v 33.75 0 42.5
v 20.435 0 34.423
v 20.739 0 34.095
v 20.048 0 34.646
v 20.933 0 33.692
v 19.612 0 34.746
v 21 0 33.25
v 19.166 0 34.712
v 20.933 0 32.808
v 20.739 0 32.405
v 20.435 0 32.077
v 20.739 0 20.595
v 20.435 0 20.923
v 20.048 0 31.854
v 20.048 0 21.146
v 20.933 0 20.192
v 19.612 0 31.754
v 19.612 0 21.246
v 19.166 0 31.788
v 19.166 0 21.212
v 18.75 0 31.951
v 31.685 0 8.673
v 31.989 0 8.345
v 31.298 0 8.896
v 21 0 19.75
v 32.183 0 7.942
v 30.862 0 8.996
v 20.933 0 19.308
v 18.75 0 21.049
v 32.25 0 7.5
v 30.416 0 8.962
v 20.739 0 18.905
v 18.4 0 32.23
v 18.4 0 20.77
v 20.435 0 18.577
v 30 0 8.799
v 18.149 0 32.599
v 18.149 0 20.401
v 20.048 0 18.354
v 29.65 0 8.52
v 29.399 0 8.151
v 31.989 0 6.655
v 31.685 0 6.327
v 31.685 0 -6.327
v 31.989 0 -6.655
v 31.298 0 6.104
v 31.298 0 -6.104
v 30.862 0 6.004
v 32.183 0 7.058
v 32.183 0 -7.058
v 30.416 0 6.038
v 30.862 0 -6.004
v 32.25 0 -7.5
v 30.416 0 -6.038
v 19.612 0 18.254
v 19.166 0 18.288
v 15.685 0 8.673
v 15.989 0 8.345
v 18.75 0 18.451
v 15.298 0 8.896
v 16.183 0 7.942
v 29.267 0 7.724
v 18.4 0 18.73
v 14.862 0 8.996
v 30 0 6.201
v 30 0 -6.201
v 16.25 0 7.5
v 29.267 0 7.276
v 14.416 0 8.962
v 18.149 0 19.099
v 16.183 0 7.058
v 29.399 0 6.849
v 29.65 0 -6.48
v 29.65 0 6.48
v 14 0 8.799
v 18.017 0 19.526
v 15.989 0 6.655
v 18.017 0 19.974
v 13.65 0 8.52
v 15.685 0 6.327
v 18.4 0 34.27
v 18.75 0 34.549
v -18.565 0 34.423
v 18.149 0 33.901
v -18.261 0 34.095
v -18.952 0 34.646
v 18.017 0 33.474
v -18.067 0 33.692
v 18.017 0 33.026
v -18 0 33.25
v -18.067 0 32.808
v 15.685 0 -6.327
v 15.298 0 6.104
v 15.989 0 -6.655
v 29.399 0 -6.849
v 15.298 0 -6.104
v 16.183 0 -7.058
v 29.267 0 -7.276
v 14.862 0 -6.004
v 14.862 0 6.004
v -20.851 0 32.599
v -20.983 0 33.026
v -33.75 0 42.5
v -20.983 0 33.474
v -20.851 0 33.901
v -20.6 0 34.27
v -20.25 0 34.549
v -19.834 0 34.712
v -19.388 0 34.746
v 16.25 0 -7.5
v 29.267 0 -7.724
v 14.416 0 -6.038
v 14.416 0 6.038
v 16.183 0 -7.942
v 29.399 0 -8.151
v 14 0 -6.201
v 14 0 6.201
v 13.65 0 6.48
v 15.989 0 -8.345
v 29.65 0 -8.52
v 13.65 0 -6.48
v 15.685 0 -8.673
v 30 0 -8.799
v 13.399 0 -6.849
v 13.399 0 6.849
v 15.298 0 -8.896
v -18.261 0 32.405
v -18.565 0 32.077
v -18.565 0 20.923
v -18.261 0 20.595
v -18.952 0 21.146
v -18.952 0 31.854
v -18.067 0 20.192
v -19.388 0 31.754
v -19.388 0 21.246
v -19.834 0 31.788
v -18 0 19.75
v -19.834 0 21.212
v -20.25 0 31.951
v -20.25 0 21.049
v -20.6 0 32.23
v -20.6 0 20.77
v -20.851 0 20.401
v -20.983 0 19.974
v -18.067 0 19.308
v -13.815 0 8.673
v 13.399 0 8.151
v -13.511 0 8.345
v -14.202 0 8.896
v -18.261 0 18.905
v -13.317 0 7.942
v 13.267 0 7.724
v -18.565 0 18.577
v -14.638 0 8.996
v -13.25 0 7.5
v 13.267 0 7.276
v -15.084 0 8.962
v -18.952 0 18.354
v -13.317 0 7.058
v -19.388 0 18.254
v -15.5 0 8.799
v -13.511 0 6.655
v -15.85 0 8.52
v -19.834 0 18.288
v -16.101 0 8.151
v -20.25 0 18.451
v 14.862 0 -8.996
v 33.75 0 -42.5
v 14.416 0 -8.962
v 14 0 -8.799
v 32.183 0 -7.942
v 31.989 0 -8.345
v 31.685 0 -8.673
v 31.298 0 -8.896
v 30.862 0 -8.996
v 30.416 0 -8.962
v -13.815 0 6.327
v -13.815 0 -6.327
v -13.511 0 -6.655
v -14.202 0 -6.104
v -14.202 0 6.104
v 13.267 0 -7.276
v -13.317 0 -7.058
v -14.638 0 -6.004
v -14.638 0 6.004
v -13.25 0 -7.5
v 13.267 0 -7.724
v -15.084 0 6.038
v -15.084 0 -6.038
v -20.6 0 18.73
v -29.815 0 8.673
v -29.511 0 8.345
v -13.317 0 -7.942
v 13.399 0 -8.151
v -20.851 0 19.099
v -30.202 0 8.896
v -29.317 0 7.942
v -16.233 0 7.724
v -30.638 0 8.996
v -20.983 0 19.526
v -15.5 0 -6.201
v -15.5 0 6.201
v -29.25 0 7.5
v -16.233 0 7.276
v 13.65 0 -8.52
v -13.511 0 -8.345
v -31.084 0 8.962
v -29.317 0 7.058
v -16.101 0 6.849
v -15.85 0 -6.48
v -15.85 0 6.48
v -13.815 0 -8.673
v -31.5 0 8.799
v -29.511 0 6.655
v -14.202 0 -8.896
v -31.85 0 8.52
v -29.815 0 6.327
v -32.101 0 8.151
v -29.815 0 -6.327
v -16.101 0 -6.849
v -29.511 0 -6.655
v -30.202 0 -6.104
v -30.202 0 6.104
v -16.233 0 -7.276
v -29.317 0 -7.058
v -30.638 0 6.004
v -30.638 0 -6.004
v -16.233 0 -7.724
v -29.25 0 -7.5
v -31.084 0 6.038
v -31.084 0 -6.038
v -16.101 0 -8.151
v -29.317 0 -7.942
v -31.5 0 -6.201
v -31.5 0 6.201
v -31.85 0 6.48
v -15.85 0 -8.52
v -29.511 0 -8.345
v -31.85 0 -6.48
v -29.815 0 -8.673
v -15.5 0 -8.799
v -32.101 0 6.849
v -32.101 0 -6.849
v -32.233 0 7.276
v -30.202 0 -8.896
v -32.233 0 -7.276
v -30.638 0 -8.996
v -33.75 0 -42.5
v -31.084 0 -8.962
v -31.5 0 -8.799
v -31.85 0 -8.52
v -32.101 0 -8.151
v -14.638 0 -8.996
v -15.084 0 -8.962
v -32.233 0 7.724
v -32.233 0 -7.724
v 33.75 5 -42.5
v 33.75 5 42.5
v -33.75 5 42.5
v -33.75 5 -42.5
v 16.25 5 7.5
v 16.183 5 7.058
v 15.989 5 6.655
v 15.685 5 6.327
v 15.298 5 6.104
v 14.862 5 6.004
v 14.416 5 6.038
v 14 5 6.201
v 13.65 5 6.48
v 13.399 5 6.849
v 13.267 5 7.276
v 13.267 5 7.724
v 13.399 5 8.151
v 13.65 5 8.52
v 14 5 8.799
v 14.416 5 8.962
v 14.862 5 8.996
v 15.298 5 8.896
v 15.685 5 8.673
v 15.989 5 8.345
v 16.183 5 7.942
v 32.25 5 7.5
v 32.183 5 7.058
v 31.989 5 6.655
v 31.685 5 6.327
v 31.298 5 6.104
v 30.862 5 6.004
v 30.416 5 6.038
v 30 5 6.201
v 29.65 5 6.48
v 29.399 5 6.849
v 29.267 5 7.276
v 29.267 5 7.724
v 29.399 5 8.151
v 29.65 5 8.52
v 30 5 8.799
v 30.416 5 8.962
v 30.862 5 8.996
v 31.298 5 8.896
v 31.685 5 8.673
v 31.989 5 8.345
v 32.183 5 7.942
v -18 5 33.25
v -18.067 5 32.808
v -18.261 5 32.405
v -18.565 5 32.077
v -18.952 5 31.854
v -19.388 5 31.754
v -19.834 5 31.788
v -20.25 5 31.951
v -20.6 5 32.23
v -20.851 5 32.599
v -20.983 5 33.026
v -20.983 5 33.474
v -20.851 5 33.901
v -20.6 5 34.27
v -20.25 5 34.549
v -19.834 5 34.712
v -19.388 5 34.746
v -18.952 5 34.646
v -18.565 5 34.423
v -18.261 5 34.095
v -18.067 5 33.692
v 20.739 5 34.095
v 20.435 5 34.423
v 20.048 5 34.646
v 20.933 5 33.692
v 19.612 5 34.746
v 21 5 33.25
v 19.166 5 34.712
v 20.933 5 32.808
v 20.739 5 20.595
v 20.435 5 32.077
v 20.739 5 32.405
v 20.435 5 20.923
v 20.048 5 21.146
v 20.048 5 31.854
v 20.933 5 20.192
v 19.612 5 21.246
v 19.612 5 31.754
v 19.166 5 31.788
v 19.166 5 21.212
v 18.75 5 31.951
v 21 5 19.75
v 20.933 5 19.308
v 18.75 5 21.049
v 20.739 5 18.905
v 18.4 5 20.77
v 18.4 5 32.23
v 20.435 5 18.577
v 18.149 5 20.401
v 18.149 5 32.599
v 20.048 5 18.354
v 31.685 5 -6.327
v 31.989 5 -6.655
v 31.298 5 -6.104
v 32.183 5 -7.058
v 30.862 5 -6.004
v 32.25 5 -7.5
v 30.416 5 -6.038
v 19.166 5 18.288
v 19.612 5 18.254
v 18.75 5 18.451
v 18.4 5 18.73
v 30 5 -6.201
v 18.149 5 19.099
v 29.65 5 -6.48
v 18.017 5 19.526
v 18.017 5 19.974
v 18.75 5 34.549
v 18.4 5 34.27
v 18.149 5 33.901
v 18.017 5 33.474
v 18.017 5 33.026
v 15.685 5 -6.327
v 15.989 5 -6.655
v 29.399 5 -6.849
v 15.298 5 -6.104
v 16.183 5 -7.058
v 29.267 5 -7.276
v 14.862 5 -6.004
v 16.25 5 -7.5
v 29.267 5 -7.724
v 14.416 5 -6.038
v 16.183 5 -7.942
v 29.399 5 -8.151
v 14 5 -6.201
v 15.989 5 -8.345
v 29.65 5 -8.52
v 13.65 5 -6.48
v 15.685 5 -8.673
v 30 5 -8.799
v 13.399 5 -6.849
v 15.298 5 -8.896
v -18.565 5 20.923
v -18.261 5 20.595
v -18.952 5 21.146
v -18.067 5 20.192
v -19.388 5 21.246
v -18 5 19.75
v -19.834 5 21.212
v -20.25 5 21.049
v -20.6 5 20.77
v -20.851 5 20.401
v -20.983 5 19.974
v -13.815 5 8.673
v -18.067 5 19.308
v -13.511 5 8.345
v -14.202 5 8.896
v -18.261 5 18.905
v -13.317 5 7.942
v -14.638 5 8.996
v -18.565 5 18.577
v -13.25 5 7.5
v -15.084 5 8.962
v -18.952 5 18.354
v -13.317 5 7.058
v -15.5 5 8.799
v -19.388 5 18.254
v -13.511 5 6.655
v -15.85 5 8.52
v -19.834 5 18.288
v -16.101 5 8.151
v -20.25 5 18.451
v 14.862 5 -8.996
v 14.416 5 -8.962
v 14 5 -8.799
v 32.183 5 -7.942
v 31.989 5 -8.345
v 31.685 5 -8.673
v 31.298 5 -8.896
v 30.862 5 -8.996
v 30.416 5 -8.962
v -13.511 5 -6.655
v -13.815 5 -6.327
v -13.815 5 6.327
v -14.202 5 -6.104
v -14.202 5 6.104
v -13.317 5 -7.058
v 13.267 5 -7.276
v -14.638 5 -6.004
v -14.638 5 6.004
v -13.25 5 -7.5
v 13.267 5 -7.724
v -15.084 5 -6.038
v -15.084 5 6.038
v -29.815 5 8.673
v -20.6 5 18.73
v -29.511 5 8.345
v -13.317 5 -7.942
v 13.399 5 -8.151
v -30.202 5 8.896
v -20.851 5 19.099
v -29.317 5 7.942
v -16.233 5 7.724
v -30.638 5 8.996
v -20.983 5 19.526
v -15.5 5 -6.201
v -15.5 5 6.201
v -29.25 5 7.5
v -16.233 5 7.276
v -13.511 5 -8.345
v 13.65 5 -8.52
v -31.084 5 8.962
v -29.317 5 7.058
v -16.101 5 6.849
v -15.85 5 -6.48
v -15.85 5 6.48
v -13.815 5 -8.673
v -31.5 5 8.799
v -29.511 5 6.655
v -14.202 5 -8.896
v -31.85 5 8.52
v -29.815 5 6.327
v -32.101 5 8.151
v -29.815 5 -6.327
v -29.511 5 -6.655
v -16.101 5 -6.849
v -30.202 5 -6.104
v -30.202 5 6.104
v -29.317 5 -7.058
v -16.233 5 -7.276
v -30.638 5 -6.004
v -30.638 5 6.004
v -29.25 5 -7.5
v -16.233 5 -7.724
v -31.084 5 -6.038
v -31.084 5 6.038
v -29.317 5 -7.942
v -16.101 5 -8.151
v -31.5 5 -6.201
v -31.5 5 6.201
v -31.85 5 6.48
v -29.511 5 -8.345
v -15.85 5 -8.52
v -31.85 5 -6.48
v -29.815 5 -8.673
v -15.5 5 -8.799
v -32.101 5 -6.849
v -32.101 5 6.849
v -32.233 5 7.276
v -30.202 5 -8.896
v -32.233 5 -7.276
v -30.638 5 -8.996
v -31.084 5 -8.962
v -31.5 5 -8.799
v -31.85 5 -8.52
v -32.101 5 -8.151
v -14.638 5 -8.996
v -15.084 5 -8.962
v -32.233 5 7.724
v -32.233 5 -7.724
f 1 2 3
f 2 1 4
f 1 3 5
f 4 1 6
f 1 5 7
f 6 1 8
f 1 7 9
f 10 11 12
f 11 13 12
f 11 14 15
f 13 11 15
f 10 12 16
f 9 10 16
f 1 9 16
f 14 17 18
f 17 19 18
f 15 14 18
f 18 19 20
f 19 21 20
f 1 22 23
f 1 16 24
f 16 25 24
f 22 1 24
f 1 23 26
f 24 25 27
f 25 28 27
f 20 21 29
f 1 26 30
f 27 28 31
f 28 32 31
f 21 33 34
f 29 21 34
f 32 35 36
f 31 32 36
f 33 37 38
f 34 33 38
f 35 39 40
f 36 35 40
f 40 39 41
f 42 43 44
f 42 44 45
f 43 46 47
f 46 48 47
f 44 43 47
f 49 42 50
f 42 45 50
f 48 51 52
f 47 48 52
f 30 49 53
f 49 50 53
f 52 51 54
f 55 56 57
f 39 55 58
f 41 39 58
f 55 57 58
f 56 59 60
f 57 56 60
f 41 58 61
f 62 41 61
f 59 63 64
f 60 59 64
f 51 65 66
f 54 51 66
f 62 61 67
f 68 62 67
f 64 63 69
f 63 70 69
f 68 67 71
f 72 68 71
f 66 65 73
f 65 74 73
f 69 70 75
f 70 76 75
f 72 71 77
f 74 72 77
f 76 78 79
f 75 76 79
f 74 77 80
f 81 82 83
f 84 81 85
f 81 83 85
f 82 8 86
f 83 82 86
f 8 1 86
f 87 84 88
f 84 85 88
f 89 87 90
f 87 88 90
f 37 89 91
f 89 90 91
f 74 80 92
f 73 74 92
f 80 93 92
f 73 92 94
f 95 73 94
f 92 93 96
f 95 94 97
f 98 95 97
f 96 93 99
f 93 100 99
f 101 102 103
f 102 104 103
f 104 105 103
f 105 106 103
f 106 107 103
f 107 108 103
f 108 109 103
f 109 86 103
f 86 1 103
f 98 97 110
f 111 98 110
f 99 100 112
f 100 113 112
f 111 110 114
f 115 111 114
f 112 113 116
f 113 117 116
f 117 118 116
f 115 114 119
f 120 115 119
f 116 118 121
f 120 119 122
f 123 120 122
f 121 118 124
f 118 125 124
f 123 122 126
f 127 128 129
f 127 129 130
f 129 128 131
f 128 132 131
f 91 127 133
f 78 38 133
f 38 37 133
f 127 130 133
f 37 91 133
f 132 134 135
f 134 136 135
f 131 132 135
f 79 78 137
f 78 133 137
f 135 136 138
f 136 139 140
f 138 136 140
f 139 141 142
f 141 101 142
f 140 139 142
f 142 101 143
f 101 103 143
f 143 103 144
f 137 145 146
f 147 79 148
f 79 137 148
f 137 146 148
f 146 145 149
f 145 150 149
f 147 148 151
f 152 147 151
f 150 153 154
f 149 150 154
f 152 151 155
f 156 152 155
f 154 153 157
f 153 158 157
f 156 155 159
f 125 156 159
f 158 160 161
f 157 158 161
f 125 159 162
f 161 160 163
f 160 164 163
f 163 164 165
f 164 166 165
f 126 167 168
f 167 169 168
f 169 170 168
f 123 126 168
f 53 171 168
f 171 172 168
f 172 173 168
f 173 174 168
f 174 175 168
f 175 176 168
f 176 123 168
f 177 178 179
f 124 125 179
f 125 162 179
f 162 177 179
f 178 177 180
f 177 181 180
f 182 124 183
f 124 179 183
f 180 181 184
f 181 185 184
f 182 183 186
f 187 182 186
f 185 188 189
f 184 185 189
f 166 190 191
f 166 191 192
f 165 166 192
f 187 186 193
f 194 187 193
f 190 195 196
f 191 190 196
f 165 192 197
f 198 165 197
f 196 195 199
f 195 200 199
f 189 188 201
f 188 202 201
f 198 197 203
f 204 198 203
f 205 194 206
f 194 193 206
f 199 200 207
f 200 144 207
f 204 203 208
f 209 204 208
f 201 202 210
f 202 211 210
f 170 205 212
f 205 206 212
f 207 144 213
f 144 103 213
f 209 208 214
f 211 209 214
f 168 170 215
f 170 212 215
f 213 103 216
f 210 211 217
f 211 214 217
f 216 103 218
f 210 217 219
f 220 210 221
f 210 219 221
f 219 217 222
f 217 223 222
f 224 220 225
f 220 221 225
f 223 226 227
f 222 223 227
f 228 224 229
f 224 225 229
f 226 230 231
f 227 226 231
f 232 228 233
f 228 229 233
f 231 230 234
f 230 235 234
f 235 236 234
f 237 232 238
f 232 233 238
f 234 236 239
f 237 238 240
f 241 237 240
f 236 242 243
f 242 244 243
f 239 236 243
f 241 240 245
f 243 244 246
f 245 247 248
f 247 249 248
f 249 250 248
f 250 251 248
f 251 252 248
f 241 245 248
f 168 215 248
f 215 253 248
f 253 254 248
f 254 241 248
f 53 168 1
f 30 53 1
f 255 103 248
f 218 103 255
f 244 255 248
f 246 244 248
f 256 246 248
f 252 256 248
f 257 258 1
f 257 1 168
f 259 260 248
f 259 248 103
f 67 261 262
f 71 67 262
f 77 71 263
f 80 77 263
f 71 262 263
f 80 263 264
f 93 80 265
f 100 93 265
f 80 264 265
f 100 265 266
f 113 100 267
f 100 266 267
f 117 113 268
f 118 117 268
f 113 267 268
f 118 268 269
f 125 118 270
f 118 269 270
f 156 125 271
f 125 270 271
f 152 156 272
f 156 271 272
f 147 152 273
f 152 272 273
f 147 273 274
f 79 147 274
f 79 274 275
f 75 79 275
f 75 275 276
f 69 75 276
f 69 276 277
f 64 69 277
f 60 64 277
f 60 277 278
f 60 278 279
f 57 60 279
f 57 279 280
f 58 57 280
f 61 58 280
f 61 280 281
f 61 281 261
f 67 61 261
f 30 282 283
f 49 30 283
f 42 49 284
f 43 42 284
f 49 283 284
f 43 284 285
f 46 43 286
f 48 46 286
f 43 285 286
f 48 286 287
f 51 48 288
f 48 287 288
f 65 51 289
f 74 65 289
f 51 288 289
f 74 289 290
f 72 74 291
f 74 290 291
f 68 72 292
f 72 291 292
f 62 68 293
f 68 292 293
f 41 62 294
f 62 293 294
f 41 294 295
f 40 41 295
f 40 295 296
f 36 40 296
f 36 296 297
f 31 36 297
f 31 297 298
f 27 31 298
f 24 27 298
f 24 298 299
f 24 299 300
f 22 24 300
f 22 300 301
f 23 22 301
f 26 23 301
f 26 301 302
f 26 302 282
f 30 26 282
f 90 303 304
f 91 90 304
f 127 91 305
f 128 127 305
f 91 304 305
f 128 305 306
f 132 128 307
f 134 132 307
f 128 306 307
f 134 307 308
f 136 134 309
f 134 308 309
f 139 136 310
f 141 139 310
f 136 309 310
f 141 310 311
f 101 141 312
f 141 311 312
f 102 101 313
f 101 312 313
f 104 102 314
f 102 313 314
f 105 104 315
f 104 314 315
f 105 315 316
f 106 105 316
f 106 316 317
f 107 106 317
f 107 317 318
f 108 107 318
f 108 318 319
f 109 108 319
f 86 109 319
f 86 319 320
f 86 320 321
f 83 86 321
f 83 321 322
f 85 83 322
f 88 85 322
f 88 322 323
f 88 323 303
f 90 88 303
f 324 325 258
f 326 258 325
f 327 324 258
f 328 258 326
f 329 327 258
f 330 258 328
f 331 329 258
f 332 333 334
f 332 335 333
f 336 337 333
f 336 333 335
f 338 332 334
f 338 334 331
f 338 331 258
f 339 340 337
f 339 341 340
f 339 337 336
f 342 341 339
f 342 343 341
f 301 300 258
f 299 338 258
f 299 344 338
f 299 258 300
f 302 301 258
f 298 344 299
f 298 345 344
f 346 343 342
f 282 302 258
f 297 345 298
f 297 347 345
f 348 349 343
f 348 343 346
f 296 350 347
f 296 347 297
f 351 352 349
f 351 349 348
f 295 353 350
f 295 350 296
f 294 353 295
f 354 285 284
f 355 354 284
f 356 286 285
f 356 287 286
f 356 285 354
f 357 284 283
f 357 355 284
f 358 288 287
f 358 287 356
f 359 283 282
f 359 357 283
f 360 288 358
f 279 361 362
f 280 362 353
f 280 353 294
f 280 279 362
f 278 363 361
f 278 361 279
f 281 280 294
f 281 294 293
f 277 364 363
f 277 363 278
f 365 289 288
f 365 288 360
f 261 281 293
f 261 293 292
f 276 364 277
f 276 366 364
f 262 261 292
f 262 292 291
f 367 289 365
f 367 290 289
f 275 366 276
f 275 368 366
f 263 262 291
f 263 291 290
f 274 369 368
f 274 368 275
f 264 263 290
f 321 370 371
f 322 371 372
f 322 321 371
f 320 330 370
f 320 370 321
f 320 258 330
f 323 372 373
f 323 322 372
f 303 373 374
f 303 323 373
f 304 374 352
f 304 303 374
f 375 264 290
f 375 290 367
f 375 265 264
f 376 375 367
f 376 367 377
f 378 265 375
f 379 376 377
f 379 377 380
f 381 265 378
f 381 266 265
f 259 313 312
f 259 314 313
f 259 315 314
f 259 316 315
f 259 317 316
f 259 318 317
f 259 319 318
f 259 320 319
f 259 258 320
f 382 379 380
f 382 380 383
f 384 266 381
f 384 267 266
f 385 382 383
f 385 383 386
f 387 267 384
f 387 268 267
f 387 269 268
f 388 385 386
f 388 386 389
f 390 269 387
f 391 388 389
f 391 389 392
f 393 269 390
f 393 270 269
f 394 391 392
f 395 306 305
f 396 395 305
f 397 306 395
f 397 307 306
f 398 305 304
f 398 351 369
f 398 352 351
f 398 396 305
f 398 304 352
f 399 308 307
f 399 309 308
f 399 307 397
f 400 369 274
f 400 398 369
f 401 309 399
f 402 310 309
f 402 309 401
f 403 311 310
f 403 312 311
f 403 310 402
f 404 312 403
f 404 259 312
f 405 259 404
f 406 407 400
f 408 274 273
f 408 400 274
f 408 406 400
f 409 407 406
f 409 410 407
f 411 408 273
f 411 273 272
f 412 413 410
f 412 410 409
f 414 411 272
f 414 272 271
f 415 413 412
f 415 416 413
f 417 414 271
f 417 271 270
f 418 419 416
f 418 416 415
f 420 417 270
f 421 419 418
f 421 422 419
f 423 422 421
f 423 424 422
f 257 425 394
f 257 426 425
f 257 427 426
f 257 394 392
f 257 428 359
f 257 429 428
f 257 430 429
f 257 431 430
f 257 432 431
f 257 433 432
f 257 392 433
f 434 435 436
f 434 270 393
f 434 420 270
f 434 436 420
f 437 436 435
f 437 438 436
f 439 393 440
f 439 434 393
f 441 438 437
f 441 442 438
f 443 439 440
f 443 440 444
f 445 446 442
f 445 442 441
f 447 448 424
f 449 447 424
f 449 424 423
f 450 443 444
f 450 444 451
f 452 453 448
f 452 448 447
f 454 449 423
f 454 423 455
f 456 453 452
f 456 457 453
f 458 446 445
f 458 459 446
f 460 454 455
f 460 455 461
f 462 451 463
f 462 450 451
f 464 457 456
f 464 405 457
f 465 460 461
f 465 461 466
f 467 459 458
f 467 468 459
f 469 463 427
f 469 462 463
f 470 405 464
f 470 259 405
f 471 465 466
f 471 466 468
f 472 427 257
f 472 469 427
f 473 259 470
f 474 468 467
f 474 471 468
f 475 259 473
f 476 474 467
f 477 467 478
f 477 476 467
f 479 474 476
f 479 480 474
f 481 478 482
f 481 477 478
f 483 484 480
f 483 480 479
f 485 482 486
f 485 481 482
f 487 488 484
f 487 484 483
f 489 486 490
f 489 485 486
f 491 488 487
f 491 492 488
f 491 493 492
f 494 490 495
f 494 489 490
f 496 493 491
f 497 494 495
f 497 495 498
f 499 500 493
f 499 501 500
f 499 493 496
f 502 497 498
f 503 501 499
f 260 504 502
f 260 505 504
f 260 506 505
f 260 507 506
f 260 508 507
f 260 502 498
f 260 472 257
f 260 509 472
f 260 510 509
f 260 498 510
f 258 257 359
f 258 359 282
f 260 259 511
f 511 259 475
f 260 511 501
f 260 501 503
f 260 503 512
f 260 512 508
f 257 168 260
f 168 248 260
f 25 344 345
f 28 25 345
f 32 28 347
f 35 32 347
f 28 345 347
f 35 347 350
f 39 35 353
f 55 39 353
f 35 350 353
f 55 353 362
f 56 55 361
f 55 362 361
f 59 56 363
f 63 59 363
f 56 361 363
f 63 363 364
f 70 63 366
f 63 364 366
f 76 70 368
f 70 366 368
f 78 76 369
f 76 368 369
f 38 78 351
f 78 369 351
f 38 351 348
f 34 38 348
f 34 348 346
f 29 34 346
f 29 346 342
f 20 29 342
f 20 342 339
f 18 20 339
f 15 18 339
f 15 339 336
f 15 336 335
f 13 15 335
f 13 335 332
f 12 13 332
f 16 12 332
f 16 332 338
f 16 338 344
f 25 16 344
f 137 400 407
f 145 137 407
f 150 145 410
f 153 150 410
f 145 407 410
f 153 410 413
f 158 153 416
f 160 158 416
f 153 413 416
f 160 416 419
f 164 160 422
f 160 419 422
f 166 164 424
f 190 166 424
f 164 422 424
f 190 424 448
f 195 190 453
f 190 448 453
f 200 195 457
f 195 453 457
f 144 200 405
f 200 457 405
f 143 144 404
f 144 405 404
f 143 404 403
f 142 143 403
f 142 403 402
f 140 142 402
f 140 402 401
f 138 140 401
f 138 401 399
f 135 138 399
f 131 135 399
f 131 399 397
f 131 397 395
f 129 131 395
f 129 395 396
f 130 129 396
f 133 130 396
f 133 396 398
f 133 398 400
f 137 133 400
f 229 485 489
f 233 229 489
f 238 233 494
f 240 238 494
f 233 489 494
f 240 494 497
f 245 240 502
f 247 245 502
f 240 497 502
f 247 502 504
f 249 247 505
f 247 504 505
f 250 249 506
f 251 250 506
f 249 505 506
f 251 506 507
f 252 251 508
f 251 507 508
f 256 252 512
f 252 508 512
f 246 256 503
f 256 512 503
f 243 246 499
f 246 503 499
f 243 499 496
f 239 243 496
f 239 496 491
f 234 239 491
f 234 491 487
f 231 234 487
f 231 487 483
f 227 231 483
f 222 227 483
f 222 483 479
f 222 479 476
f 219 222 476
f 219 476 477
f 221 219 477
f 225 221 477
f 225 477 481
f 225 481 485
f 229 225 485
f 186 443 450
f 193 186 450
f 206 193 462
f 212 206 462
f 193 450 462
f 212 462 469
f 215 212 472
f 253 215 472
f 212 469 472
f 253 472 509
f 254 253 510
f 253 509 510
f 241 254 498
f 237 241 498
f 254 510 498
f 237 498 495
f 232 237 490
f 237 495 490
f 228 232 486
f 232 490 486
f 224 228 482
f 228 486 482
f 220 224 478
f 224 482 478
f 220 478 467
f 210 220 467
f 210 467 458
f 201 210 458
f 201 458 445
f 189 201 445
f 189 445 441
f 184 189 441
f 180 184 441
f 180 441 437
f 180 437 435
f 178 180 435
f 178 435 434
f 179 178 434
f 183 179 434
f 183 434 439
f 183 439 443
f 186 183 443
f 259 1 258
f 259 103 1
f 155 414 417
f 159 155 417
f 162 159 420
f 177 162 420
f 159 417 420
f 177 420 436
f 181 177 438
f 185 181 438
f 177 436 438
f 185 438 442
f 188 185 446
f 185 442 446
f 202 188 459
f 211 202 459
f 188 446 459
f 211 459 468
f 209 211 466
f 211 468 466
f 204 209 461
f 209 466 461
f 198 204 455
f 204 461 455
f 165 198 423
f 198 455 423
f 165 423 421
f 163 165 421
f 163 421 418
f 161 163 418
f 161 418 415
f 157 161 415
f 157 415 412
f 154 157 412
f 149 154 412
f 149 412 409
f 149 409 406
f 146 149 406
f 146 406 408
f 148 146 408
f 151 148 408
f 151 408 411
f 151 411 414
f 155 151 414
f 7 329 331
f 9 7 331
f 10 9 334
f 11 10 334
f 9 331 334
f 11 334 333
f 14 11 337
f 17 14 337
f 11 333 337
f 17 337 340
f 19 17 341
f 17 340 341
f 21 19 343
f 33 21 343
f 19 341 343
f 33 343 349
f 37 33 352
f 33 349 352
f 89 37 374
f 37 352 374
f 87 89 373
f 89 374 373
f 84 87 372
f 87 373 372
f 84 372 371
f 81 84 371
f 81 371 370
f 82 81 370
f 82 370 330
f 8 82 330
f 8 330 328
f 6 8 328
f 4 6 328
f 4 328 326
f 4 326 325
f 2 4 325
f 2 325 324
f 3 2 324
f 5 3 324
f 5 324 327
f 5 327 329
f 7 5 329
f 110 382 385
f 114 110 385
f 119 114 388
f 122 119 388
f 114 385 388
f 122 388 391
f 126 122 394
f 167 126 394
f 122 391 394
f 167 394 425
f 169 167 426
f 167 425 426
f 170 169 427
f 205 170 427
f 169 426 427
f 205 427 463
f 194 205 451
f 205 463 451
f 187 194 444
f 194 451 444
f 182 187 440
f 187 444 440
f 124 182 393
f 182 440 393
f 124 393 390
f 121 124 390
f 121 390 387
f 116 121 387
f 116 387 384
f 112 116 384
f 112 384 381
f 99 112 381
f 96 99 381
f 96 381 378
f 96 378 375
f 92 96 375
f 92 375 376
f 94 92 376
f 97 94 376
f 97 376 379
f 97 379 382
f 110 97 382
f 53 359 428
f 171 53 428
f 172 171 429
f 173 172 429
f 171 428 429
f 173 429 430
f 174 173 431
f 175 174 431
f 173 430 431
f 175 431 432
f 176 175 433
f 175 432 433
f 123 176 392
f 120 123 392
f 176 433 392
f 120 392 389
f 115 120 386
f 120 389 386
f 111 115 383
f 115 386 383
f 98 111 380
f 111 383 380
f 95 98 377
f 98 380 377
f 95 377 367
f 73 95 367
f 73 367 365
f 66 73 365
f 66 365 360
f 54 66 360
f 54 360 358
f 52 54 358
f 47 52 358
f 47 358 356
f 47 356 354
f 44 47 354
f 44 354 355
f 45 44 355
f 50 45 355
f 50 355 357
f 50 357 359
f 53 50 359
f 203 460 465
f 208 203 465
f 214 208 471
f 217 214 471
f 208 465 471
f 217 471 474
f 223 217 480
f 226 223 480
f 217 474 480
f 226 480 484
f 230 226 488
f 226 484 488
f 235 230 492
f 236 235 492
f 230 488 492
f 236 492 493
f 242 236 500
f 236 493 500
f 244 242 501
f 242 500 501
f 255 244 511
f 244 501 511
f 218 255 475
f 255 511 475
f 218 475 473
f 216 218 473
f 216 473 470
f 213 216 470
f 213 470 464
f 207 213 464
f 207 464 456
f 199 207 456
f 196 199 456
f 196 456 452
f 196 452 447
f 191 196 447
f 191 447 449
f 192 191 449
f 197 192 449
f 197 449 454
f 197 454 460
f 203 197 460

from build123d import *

# Parameters (mm, degrees)
SKETCH1_W           = 66
SKETCH1_H           = 85
BOSS_EXTRUDE1_DEPTH = 5
SKETCH4_R           = 1.5
CUT_EXTRUDE2_DEPTH  = 10
SKETCH8_W           = 85
SKETCH8_H           = 5
BOSS_EXTRUDE2_DEPTH = 0.75
SKETCH9_W           = 85
SKETCH9_H           = 5
BOSS_EXTRUDE3_DEPTH = 0.75
SKETCH10_R          = 1.5
CUT_EXTRUDE3_DEPTH  = 10


with BuildPart() as part:
    # Sketch1 → Boss-Extrude1 (new body)
    with BuildSketch(Plane(origin=(0, 0, 0), x_dir=(1, 0, 0), z_dir=(0, 1, 0))):
        Rectangle(SKETCH1_W, SKETCH1_H)
    extrude(amount=BOSS_EXTRUDE1_DEPTH)

    # Sketch4 → Cut-Extrude2 (cut)
    with BuildSketch(Plane(origin=(0, 5, 0), x_dir=(1, 0, 0), z_dir=(0, 1, 0))):
        with Locations((-30.75, 7.5)):
            Circle(SKETCH4_R)
        with Locations((-14.75, 7.5)):
            Circle(SKETCH4_R)
        with Locations((-30.75, -7.5)):
            Circle(SKETCH4_R)
        with Locations((-14.75, -7.5)):
            Circle(SKETCH4_R)
        with Locations((14.75, -7.5)):
            Circle(SKETCH4_R)
        with Locations((30.75, -7.5)):
            Circle(SKETCH4_R)
        with Locations((14.75, 7.5)):
            Circle(SKETCH4_R)
        with Locations((30.75, 7.5)):
            Circle(SKETCH4_R)
    extrude(amount=-CUT_EXTRUDE2_DEPTH, mode=Mode.SUBTRACT)

    # Sketch8 → Boss-Extrude2 (add)
    with BuildSketch(Plane.ZY.offset(33)):
        with Locations((0, 2.5)):
            Rectangle(SKETCH8_W, SKETCH8_H)
    extrude(amount=BOSS_EXTRUDE2_DEPTH)

    # Sketch9 → Boss-Extrude3 (add)
    with BuildSketch(Plane(origin=(33, 0, 0), x_dir=(0, 0, -1), z_dir=(1, 0, 0))):
        with Locations((0, 2.5)):
            Rectangle(SKETCH9_W, SKETCH9_H)
    extrude(amount=BOSS_EXTRUDE3_DEPTH)

    # Sketch10 → Cut-Extrude3 (cut)
    with BuildSketch(Plane(origin=(0, 5, 0), x_dir=(1, 0, 0), z_dir=(0, 1, 0))):
        with Locations((-19.5, -33.25)):
            Circle(SKETCH10_R)
        with Locations((-19.5, -19.75)):
            Circle(SKETCH10_R)
        with Locations((19.5, -33.25)):
            Circle(SKETCH10_R)
        with Locations((19.5, -19.75)):
            Circle(SKETCH10_R)
    extrude(amount=-CUT_EXTRUDE3_DEPTH, mode=Mode.SUBTRACT)


solid = part.part
